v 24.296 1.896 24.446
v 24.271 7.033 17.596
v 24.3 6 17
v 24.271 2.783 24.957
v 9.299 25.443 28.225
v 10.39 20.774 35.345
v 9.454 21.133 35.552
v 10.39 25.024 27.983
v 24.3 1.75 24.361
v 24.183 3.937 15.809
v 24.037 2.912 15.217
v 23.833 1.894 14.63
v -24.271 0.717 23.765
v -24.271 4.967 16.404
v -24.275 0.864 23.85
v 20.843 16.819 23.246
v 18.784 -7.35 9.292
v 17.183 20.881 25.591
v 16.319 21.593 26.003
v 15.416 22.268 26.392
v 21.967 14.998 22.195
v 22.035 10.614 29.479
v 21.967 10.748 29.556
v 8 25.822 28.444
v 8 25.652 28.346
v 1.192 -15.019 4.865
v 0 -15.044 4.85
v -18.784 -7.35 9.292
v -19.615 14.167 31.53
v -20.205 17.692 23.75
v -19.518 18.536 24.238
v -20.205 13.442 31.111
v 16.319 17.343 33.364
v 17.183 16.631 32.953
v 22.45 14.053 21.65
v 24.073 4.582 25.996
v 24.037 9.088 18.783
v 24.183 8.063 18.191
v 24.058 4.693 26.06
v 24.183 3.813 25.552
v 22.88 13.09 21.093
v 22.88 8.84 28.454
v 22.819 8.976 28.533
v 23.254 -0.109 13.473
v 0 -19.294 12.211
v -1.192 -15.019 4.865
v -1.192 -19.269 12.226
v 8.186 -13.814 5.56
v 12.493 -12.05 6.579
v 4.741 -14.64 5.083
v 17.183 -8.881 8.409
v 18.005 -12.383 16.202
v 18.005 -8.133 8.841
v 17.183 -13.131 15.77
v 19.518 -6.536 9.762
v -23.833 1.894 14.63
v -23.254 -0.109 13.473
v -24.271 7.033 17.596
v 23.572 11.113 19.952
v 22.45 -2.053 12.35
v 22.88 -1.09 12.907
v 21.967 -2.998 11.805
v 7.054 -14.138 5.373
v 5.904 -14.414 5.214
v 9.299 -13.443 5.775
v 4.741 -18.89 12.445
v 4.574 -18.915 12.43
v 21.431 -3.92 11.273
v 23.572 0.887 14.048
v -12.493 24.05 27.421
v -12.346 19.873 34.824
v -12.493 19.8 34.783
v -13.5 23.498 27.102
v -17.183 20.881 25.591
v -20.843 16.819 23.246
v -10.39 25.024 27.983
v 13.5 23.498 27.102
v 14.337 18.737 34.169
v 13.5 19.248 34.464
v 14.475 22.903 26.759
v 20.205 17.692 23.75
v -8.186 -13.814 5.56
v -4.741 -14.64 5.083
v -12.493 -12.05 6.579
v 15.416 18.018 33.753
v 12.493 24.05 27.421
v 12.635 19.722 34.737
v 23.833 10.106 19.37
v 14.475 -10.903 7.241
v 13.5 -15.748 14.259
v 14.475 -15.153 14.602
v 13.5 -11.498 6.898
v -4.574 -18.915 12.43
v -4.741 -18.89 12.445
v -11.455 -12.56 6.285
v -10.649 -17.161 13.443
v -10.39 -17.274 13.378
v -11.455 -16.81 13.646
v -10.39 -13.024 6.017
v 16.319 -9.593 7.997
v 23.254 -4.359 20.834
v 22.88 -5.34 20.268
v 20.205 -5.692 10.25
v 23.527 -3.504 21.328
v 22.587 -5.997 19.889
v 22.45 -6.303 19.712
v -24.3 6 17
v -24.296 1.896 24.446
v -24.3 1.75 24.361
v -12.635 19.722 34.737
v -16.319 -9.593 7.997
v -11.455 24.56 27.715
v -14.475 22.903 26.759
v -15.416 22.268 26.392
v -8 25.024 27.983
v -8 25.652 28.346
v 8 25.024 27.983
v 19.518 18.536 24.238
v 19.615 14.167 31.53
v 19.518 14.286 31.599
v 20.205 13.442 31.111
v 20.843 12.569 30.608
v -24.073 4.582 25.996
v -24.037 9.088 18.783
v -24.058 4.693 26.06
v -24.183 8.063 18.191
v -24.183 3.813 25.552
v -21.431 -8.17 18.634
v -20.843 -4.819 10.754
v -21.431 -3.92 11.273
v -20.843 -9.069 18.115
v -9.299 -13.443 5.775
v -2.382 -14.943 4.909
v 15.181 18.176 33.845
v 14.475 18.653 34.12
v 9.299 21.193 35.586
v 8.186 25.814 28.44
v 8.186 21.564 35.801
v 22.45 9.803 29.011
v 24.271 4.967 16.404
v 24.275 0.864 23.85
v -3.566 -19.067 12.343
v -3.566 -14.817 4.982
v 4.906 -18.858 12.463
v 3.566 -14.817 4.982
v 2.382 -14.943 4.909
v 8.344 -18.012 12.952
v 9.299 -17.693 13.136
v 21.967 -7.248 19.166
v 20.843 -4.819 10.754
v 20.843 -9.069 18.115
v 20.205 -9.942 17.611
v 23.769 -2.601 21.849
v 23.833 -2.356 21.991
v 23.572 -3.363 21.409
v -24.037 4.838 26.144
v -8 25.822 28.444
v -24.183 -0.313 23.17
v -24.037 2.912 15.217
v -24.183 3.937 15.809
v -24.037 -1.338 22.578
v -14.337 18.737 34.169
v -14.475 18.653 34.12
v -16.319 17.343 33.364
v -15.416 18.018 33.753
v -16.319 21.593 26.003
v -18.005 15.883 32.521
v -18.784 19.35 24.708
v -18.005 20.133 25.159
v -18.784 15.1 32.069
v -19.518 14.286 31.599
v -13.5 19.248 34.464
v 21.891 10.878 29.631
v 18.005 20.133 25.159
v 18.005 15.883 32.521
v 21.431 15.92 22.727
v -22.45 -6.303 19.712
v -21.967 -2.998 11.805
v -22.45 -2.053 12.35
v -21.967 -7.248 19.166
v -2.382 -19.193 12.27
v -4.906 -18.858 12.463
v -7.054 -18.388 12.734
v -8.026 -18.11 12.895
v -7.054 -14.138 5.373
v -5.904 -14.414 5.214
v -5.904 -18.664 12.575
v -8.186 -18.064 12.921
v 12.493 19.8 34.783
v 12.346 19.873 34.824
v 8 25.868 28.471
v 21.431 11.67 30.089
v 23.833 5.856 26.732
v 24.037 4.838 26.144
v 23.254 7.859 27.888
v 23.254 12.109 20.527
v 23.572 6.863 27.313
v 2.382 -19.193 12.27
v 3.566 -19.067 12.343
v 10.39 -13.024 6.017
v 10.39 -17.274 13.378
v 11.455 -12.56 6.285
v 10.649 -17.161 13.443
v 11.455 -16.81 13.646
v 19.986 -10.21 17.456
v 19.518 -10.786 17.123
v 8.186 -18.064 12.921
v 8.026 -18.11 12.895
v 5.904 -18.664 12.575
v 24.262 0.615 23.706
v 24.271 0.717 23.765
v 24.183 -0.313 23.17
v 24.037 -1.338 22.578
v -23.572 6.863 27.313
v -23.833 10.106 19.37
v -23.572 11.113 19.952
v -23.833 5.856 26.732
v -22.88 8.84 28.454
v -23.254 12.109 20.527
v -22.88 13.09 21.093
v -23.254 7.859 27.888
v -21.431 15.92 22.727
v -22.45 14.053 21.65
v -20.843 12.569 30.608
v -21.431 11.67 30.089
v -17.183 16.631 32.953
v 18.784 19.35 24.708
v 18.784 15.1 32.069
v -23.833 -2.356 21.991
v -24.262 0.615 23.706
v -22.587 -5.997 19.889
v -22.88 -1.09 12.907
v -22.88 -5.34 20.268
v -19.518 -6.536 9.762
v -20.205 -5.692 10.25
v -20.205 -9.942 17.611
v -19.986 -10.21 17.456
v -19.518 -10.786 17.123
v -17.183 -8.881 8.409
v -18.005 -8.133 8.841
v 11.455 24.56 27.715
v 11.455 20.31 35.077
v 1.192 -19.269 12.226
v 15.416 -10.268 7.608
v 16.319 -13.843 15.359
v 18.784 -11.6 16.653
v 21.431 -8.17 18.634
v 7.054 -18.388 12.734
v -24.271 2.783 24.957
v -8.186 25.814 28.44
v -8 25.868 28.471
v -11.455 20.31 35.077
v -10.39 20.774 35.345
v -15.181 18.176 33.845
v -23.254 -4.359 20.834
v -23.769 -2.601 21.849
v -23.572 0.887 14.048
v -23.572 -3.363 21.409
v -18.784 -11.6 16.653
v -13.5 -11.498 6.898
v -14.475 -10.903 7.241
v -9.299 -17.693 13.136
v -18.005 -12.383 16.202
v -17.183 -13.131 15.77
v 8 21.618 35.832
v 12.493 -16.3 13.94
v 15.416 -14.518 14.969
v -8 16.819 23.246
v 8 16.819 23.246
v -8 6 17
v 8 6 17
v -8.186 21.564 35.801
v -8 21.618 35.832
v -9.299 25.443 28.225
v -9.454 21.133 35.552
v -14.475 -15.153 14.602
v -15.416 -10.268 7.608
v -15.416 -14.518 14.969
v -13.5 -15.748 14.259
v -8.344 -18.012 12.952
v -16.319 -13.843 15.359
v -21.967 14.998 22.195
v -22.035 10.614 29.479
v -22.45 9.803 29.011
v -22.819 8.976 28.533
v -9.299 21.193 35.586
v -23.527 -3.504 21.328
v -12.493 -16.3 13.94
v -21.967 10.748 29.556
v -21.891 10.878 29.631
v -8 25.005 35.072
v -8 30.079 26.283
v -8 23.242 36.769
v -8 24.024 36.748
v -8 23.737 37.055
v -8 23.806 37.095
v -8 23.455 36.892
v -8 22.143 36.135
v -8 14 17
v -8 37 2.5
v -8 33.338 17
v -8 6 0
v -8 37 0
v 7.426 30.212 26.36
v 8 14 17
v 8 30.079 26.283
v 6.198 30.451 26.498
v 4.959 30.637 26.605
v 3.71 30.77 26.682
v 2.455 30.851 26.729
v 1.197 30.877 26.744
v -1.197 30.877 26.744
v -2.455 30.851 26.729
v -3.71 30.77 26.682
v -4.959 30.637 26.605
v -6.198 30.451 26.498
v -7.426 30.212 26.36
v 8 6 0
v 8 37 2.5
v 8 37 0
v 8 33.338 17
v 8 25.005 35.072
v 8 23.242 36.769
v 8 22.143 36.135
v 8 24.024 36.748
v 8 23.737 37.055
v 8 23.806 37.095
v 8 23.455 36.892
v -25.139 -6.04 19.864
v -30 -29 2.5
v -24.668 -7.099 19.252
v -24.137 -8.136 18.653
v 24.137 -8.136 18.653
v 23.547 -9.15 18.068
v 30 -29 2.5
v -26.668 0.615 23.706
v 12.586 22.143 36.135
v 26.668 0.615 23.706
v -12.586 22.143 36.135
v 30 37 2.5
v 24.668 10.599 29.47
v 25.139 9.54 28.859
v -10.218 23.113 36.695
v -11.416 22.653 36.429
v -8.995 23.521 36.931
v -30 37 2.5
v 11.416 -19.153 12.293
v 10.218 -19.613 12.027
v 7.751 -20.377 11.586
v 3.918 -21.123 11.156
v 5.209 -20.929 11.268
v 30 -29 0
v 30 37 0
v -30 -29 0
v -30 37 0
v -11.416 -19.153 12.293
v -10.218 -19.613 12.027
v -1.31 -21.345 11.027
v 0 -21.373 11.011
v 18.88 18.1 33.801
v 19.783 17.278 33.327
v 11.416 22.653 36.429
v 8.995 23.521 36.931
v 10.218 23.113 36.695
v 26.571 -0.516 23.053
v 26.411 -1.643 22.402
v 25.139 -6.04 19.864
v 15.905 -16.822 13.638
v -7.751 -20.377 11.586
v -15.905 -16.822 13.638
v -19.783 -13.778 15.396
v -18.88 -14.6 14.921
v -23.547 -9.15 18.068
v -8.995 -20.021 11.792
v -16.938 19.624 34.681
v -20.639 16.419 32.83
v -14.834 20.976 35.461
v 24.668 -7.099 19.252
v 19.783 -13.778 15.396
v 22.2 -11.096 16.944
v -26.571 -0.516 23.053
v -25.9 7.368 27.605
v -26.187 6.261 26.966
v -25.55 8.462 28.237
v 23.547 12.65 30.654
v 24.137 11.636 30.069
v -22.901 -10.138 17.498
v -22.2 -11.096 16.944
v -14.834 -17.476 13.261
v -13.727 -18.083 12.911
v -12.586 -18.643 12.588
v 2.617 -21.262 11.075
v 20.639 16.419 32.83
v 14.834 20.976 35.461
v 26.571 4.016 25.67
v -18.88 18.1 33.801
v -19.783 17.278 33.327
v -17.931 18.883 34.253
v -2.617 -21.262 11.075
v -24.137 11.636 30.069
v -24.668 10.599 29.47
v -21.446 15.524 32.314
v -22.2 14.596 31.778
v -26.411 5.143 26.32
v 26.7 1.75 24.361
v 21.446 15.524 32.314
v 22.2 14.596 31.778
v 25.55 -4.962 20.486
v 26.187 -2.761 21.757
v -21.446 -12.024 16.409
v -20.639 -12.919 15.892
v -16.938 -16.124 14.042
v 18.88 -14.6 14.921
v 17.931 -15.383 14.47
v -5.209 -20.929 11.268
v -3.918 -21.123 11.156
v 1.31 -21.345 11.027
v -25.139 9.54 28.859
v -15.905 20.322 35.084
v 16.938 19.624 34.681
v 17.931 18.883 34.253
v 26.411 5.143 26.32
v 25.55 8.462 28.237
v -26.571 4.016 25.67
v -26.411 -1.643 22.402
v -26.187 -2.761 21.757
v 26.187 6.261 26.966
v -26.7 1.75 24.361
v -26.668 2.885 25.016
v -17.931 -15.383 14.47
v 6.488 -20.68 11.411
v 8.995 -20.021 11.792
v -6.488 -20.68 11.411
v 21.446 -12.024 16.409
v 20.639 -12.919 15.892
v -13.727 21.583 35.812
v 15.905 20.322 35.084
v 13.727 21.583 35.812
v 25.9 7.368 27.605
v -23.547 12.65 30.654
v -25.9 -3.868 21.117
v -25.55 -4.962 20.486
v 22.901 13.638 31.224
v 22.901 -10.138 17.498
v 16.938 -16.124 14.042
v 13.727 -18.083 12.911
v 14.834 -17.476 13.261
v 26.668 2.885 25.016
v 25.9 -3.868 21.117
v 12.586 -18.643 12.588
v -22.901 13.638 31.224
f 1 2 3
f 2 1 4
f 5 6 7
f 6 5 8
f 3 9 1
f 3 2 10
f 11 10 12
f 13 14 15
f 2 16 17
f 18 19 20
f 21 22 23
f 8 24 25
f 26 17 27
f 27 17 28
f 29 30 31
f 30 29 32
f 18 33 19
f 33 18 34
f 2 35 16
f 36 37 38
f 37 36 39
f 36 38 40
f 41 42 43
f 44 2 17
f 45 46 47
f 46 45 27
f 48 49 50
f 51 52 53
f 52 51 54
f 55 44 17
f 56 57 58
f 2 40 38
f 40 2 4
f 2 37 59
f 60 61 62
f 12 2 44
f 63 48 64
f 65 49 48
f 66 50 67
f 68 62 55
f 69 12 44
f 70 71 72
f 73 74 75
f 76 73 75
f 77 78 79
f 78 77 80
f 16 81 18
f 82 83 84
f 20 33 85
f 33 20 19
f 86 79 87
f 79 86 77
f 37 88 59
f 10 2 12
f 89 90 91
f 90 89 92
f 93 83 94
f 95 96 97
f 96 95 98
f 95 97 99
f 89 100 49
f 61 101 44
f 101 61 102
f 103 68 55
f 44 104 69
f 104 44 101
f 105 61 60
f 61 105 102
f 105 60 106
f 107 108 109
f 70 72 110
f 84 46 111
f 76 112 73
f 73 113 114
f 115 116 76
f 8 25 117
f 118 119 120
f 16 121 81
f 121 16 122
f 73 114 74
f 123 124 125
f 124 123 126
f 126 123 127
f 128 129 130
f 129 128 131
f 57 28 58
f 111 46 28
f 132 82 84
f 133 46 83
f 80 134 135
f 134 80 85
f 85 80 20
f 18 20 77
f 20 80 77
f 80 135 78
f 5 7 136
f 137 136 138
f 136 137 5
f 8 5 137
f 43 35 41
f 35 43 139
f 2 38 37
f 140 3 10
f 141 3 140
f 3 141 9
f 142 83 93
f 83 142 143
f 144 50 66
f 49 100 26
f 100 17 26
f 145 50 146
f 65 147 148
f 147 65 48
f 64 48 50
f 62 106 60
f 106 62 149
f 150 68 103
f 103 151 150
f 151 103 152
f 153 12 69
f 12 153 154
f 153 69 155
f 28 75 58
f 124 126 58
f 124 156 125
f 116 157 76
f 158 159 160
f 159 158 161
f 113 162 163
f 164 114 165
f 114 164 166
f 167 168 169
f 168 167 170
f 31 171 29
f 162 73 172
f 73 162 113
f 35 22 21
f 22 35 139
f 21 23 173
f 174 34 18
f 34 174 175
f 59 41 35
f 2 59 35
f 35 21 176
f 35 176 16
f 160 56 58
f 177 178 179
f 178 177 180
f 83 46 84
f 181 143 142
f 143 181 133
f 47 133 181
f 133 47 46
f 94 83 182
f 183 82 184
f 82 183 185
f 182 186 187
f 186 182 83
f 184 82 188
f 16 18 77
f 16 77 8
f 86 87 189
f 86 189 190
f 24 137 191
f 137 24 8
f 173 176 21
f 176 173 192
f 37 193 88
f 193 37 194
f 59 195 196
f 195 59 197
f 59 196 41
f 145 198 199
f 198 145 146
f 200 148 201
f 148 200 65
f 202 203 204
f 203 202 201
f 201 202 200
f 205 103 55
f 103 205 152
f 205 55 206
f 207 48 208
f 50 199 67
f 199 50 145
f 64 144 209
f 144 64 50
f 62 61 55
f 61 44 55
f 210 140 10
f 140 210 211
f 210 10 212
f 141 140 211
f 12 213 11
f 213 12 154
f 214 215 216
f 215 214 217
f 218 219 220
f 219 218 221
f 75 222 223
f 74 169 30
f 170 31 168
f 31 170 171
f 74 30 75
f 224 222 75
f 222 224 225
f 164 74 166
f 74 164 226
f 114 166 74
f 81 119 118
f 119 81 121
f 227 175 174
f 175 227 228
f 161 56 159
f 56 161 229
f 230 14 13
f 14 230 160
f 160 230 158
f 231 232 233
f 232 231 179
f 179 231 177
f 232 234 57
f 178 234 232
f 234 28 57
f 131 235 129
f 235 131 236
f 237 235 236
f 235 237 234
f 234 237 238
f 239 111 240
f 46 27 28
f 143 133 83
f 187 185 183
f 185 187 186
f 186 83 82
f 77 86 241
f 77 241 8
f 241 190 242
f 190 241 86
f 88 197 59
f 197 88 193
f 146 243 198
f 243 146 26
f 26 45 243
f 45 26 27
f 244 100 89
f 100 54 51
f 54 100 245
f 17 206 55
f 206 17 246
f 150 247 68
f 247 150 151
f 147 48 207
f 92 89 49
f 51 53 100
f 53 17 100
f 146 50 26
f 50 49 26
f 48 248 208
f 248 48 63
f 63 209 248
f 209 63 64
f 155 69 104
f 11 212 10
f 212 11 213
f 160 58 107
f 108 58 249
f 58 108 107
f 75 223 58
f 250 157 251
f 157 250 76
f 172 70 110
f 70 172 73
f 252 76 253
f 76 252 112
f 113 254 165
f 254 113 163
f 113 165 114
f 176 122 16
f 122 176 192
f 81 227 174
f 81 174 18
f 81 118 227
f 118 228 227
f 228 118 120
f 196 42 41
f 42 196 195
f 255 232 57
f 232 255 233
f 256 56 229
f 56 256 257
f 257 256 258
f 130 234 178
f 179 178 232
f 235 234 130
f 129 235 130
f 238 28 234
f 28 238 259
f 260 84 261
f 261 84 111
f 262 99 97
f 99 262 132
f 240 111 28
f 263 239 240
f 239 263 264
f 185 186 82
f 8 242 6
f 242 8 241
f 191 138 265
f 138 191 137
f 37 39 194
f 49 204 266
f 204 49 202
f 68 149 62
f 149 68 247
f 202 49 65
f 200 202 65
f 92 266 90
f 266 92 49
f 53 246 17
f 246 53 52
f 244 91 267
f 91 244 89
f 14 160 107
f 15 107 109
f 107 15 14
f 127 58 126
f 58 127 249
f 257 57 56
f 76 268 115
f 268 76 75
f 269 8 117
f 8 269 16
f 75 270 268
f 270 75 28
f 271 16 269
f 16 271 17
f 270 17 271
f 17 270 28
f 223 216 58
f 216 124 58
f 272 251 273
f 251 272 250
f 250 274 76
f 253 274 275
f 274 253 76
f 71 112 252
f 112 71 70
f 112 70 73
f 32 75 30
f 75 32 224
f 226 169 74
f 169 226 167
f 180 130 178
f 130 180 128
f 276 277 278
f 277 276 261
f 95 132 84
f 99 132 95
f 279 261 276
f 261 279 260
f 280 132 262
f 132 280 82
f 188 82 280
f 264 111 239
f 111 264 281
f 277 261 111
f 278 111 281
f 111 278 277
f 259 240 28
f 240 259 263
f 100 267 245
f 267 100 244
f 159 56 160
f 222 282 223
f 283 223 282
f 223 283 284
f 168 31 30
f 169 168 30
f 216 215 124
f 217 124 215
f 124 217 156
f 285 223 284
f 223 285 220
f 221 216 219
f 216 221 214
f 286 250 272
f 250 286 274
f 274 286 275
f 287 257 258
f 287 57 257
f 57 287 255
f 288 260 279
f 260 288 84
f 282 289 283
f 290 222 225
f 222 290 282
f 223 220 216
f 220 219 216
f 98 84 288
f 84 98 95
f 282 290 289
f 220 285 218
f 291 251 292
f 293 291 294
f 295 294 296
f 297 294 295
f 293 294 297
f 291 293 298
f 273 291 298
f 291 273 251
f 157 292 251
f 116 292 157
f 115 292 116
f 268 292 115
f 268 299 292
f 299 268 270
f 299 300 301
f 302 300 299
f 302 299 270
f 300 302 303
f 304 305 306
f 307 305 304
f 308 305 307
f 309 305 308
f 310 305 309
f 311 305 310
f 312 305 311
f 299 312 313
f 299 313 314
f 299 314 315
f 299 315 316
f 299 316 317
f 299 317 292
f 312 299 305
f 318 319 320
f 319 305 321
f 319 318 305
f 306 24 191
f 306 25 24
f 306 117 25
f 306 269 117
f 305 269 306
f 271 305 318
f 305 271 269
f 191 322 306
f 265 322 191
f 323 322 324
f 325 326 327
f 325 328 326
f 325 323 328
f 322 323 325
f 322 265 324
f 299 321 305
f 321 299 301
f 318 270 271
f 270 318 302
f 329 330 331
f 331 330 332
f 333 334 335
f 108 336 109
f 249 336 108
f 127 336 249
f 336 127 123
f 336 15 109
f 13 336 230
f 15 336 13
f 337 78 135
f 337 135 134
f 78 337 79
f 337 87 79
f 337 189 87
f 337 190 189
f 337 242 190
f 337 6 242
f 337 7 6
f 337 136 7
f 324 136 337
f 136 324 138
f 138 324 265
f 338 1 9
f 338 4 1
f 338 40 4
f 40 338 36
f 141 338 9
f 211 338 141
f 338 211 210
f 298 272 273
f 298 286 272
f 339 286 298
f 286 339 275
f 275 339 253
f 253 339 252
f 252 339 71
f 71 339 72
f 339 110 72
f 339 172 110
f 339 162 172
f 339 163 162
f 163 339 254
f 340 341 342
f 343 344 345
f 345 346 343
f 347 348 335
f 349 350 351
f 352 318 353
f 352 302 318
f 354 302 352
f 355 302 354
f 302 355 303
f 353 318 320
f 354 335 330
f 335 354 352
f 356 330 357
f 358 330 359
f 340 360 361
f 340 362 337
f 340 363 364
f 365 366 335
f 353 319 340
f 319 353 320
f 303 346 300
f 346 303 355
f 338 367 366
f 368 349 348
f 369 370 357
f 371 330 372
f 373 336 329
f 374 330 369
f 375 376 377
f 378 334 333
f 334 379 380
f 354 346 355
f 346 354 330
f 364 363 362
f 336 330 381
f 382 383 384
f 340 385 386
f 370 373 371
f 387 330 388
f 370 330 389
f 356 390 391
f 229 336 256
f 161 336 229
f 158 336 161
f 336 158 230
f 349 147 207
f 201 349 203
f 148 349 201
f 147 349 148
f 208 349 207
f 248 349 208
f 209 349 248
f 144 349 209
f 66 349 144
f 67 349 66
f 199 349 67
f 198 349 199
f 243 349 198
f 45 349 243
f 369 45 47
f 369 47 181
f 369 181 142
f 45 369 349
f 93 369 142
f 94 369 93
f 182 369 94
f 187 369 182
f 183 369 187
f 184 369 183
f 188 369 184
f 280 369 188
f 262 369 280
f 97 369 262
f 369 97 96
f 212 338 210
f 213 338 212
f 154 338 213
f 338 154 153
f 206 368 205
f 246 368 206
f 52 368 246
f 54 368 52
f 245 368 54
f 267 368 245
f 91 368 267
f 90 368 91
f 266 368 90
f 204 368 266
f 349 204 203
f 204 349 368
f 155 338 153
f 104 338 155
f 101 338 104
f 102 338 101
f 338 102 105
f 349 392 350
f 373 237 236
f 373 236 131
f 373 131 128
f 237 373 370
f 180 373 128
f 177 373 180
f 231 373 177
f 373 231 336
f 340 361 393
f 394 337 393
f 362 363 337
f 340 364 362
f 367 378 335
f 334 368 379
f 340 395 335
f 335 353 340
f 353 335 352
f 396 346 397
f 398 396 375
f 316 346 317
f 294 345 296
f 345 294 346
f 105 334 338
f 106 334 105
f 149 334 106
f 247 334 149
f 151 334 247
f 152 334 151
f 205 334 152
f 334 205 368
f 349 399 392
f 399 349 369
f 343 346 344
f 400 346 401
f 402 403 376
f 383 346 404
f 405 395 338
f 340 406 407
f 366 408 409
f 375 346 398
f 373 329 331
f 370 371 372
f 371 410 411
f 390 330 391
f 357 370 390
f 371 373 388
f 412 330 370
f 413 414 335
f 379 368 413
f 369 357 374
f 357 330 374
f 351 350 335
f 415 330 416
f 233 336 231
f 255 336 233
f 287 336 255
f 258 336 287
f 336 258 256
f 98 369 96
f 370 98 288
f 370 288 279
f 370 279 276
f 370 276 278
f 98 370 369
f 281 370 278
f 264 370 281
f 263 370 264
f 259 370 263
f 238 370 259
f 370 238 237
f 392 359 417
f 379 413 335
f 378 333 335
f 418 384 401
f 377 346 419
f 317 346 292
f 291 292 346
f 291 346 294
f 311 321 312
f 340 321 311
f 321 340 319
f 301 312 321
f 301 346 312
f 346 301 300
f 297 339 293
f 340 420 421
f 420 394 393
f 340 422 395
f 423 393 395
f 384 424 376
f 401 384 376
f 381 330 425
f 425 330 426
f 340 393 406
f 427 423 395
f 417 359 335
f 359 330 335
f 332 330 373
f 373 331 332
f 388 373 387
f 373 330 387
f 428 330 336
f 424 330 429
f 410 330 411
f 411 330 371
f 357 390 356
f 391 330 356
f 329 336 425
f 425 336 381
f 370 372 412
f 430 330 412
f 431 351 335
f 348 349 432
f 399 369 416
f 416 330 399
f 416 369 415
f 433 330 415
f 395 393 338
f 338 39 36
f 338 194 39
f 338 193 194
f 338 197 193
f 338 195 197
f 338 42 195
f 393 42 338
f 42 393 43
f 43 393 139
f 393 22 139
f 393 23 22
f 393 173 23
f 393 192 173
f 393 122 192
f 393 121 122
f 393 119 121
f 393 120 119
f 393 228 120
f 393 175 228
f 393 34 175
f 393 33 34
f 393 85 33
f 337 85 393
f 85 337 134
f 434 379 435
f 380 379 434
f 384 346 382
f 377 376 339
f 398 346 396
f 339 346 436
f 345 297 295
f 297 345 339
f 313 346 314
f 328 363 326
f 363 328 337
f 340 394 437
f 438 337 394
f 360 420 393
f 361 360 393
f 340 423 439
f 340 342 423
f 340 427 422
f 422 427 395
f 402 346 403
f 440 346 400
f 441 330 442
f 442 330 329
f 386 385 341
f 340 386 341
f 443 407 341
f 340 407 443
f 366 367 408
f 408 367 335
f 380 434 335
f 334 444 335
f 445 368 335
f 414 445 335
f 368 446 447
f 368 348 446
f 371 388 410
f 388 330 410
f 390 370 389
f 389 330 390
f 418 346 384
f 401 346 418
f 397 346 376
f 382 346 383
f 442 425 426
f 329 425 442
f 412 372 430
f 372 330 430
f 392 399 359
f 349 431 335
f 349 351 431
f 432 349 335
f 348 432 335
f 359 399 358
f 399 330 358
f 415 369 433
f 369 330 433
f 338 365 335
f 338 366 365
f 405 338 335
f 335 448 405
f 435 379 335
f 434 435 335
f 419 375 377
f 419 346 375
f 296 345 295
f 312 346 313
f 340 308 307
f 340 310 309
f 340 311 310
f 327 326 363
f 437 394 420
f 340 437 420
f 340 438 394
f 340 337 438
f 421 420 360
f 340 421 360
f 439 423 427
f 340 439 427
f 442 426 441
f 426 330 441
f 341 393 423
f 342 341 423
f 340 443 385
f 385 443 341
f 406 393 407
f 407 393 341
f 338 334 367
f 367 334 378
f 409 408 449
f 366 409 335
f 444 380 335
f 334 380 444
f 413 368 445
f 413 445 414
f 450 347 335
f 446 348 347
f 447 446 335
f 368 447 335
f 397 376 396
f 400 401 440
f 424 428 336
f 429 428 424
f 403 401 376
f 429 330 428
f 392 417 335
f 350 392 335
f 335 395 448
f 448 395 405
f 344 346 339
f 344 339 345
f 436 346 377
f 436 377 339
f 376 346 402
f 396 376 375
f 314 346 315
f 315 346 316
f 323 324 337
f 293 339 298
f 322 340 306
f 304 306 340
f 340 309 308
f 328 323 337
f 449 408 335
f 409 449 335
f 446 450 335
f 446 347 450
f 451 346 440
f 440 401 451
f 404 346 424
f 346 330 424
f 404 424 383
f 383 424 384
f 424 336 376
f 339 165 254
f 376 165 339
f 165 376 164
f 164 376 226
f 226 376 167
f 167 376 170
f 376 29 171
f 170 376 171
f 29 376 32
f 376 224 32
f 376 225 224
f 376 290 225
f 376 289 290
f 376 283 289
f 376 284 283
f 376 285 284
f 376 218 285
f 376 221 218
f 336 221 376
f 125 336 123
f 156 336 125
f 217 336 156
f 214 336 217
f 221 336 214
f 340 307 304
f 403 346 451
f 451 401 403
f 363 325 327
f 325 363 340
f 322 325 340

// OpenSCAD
// Desk stand for a 48 mm round ESP32-S3 knob display
// (Elecrow CrowPanel 1.28" rotary / IoTeikXgo clone, 48 x 48 x 33 mm)
//
// Screen tilted back 30 deg, cable exits out the back at desk level.
// Everything below is in millimetres.  Tweak, press F6, export STL.

/* [Device] */
dev_d     = 48;     // device outer diameter
grip_h    = 10;     // height of the NON-rotating lower body (measure yours!)
tol       = 0.6;    // diametral clearance for a snug slide-in fit

/* [Stand] */
tilt      = 30;     // degrees back from vertical
wall      = 2.4;    // cradle wall thickness
floor_t   = 3;      // cradle floor thickness
knob_gap  = 1.5;    // extra gap so the rim never touches the knob
cable_w   = 16;     // width of the cable channel
foot_w    = 60;     // footprint width  (x)
foot_d    = 66;     // footprint depth  (y)
foot_t    = 2.5;    // footprint plate thickness
cradle_y  = 6;      // cradle floor centre: forward(-)/back(+) of footprint centre
cradle_z  = 17;     // cradle floor centre height above desk

$fn = 128;

cup_h   = grip_h - knob_gap;          // actual wall height
cup_od  = dev_d + tol + 2*wall;
cup_id  = dev_d + tol;

module tilted() {                      // frame whose +Z is the cup axis
    translate([0, cradle_y, cradle_z]) rotate([tilt, 0, 0]) children();
}

module outer_body() {
    hull() {
        tilted() translate([0,0,-floor_t]) cylinder(d=cup_od, h=cup_h+floor_t);
        translate([-foot_w/2, -foot_d/2 + 4, 0]) cube([foot_w, foot_d, foot_t]);
    }
}

module cavities() {
    // device pocket (long so it opens the top of the hull)
    tilted() cylinder(d=cup_id, h=60);
    // slot through the cup floor, from axis to the rear
    tilted() translate([-cable_w/2, 0, -floor_t-1]) cube([cable_w, 40, floor_t+cup_h+2]);
    // tunnel from under the cup down and out the back at desk level
    translate([-cable_w/2, cradle_y, -1]) cube([cable_w, 60, cradle_z + 1]);
}

difference() {
    outer_body();
    cavities();
}
